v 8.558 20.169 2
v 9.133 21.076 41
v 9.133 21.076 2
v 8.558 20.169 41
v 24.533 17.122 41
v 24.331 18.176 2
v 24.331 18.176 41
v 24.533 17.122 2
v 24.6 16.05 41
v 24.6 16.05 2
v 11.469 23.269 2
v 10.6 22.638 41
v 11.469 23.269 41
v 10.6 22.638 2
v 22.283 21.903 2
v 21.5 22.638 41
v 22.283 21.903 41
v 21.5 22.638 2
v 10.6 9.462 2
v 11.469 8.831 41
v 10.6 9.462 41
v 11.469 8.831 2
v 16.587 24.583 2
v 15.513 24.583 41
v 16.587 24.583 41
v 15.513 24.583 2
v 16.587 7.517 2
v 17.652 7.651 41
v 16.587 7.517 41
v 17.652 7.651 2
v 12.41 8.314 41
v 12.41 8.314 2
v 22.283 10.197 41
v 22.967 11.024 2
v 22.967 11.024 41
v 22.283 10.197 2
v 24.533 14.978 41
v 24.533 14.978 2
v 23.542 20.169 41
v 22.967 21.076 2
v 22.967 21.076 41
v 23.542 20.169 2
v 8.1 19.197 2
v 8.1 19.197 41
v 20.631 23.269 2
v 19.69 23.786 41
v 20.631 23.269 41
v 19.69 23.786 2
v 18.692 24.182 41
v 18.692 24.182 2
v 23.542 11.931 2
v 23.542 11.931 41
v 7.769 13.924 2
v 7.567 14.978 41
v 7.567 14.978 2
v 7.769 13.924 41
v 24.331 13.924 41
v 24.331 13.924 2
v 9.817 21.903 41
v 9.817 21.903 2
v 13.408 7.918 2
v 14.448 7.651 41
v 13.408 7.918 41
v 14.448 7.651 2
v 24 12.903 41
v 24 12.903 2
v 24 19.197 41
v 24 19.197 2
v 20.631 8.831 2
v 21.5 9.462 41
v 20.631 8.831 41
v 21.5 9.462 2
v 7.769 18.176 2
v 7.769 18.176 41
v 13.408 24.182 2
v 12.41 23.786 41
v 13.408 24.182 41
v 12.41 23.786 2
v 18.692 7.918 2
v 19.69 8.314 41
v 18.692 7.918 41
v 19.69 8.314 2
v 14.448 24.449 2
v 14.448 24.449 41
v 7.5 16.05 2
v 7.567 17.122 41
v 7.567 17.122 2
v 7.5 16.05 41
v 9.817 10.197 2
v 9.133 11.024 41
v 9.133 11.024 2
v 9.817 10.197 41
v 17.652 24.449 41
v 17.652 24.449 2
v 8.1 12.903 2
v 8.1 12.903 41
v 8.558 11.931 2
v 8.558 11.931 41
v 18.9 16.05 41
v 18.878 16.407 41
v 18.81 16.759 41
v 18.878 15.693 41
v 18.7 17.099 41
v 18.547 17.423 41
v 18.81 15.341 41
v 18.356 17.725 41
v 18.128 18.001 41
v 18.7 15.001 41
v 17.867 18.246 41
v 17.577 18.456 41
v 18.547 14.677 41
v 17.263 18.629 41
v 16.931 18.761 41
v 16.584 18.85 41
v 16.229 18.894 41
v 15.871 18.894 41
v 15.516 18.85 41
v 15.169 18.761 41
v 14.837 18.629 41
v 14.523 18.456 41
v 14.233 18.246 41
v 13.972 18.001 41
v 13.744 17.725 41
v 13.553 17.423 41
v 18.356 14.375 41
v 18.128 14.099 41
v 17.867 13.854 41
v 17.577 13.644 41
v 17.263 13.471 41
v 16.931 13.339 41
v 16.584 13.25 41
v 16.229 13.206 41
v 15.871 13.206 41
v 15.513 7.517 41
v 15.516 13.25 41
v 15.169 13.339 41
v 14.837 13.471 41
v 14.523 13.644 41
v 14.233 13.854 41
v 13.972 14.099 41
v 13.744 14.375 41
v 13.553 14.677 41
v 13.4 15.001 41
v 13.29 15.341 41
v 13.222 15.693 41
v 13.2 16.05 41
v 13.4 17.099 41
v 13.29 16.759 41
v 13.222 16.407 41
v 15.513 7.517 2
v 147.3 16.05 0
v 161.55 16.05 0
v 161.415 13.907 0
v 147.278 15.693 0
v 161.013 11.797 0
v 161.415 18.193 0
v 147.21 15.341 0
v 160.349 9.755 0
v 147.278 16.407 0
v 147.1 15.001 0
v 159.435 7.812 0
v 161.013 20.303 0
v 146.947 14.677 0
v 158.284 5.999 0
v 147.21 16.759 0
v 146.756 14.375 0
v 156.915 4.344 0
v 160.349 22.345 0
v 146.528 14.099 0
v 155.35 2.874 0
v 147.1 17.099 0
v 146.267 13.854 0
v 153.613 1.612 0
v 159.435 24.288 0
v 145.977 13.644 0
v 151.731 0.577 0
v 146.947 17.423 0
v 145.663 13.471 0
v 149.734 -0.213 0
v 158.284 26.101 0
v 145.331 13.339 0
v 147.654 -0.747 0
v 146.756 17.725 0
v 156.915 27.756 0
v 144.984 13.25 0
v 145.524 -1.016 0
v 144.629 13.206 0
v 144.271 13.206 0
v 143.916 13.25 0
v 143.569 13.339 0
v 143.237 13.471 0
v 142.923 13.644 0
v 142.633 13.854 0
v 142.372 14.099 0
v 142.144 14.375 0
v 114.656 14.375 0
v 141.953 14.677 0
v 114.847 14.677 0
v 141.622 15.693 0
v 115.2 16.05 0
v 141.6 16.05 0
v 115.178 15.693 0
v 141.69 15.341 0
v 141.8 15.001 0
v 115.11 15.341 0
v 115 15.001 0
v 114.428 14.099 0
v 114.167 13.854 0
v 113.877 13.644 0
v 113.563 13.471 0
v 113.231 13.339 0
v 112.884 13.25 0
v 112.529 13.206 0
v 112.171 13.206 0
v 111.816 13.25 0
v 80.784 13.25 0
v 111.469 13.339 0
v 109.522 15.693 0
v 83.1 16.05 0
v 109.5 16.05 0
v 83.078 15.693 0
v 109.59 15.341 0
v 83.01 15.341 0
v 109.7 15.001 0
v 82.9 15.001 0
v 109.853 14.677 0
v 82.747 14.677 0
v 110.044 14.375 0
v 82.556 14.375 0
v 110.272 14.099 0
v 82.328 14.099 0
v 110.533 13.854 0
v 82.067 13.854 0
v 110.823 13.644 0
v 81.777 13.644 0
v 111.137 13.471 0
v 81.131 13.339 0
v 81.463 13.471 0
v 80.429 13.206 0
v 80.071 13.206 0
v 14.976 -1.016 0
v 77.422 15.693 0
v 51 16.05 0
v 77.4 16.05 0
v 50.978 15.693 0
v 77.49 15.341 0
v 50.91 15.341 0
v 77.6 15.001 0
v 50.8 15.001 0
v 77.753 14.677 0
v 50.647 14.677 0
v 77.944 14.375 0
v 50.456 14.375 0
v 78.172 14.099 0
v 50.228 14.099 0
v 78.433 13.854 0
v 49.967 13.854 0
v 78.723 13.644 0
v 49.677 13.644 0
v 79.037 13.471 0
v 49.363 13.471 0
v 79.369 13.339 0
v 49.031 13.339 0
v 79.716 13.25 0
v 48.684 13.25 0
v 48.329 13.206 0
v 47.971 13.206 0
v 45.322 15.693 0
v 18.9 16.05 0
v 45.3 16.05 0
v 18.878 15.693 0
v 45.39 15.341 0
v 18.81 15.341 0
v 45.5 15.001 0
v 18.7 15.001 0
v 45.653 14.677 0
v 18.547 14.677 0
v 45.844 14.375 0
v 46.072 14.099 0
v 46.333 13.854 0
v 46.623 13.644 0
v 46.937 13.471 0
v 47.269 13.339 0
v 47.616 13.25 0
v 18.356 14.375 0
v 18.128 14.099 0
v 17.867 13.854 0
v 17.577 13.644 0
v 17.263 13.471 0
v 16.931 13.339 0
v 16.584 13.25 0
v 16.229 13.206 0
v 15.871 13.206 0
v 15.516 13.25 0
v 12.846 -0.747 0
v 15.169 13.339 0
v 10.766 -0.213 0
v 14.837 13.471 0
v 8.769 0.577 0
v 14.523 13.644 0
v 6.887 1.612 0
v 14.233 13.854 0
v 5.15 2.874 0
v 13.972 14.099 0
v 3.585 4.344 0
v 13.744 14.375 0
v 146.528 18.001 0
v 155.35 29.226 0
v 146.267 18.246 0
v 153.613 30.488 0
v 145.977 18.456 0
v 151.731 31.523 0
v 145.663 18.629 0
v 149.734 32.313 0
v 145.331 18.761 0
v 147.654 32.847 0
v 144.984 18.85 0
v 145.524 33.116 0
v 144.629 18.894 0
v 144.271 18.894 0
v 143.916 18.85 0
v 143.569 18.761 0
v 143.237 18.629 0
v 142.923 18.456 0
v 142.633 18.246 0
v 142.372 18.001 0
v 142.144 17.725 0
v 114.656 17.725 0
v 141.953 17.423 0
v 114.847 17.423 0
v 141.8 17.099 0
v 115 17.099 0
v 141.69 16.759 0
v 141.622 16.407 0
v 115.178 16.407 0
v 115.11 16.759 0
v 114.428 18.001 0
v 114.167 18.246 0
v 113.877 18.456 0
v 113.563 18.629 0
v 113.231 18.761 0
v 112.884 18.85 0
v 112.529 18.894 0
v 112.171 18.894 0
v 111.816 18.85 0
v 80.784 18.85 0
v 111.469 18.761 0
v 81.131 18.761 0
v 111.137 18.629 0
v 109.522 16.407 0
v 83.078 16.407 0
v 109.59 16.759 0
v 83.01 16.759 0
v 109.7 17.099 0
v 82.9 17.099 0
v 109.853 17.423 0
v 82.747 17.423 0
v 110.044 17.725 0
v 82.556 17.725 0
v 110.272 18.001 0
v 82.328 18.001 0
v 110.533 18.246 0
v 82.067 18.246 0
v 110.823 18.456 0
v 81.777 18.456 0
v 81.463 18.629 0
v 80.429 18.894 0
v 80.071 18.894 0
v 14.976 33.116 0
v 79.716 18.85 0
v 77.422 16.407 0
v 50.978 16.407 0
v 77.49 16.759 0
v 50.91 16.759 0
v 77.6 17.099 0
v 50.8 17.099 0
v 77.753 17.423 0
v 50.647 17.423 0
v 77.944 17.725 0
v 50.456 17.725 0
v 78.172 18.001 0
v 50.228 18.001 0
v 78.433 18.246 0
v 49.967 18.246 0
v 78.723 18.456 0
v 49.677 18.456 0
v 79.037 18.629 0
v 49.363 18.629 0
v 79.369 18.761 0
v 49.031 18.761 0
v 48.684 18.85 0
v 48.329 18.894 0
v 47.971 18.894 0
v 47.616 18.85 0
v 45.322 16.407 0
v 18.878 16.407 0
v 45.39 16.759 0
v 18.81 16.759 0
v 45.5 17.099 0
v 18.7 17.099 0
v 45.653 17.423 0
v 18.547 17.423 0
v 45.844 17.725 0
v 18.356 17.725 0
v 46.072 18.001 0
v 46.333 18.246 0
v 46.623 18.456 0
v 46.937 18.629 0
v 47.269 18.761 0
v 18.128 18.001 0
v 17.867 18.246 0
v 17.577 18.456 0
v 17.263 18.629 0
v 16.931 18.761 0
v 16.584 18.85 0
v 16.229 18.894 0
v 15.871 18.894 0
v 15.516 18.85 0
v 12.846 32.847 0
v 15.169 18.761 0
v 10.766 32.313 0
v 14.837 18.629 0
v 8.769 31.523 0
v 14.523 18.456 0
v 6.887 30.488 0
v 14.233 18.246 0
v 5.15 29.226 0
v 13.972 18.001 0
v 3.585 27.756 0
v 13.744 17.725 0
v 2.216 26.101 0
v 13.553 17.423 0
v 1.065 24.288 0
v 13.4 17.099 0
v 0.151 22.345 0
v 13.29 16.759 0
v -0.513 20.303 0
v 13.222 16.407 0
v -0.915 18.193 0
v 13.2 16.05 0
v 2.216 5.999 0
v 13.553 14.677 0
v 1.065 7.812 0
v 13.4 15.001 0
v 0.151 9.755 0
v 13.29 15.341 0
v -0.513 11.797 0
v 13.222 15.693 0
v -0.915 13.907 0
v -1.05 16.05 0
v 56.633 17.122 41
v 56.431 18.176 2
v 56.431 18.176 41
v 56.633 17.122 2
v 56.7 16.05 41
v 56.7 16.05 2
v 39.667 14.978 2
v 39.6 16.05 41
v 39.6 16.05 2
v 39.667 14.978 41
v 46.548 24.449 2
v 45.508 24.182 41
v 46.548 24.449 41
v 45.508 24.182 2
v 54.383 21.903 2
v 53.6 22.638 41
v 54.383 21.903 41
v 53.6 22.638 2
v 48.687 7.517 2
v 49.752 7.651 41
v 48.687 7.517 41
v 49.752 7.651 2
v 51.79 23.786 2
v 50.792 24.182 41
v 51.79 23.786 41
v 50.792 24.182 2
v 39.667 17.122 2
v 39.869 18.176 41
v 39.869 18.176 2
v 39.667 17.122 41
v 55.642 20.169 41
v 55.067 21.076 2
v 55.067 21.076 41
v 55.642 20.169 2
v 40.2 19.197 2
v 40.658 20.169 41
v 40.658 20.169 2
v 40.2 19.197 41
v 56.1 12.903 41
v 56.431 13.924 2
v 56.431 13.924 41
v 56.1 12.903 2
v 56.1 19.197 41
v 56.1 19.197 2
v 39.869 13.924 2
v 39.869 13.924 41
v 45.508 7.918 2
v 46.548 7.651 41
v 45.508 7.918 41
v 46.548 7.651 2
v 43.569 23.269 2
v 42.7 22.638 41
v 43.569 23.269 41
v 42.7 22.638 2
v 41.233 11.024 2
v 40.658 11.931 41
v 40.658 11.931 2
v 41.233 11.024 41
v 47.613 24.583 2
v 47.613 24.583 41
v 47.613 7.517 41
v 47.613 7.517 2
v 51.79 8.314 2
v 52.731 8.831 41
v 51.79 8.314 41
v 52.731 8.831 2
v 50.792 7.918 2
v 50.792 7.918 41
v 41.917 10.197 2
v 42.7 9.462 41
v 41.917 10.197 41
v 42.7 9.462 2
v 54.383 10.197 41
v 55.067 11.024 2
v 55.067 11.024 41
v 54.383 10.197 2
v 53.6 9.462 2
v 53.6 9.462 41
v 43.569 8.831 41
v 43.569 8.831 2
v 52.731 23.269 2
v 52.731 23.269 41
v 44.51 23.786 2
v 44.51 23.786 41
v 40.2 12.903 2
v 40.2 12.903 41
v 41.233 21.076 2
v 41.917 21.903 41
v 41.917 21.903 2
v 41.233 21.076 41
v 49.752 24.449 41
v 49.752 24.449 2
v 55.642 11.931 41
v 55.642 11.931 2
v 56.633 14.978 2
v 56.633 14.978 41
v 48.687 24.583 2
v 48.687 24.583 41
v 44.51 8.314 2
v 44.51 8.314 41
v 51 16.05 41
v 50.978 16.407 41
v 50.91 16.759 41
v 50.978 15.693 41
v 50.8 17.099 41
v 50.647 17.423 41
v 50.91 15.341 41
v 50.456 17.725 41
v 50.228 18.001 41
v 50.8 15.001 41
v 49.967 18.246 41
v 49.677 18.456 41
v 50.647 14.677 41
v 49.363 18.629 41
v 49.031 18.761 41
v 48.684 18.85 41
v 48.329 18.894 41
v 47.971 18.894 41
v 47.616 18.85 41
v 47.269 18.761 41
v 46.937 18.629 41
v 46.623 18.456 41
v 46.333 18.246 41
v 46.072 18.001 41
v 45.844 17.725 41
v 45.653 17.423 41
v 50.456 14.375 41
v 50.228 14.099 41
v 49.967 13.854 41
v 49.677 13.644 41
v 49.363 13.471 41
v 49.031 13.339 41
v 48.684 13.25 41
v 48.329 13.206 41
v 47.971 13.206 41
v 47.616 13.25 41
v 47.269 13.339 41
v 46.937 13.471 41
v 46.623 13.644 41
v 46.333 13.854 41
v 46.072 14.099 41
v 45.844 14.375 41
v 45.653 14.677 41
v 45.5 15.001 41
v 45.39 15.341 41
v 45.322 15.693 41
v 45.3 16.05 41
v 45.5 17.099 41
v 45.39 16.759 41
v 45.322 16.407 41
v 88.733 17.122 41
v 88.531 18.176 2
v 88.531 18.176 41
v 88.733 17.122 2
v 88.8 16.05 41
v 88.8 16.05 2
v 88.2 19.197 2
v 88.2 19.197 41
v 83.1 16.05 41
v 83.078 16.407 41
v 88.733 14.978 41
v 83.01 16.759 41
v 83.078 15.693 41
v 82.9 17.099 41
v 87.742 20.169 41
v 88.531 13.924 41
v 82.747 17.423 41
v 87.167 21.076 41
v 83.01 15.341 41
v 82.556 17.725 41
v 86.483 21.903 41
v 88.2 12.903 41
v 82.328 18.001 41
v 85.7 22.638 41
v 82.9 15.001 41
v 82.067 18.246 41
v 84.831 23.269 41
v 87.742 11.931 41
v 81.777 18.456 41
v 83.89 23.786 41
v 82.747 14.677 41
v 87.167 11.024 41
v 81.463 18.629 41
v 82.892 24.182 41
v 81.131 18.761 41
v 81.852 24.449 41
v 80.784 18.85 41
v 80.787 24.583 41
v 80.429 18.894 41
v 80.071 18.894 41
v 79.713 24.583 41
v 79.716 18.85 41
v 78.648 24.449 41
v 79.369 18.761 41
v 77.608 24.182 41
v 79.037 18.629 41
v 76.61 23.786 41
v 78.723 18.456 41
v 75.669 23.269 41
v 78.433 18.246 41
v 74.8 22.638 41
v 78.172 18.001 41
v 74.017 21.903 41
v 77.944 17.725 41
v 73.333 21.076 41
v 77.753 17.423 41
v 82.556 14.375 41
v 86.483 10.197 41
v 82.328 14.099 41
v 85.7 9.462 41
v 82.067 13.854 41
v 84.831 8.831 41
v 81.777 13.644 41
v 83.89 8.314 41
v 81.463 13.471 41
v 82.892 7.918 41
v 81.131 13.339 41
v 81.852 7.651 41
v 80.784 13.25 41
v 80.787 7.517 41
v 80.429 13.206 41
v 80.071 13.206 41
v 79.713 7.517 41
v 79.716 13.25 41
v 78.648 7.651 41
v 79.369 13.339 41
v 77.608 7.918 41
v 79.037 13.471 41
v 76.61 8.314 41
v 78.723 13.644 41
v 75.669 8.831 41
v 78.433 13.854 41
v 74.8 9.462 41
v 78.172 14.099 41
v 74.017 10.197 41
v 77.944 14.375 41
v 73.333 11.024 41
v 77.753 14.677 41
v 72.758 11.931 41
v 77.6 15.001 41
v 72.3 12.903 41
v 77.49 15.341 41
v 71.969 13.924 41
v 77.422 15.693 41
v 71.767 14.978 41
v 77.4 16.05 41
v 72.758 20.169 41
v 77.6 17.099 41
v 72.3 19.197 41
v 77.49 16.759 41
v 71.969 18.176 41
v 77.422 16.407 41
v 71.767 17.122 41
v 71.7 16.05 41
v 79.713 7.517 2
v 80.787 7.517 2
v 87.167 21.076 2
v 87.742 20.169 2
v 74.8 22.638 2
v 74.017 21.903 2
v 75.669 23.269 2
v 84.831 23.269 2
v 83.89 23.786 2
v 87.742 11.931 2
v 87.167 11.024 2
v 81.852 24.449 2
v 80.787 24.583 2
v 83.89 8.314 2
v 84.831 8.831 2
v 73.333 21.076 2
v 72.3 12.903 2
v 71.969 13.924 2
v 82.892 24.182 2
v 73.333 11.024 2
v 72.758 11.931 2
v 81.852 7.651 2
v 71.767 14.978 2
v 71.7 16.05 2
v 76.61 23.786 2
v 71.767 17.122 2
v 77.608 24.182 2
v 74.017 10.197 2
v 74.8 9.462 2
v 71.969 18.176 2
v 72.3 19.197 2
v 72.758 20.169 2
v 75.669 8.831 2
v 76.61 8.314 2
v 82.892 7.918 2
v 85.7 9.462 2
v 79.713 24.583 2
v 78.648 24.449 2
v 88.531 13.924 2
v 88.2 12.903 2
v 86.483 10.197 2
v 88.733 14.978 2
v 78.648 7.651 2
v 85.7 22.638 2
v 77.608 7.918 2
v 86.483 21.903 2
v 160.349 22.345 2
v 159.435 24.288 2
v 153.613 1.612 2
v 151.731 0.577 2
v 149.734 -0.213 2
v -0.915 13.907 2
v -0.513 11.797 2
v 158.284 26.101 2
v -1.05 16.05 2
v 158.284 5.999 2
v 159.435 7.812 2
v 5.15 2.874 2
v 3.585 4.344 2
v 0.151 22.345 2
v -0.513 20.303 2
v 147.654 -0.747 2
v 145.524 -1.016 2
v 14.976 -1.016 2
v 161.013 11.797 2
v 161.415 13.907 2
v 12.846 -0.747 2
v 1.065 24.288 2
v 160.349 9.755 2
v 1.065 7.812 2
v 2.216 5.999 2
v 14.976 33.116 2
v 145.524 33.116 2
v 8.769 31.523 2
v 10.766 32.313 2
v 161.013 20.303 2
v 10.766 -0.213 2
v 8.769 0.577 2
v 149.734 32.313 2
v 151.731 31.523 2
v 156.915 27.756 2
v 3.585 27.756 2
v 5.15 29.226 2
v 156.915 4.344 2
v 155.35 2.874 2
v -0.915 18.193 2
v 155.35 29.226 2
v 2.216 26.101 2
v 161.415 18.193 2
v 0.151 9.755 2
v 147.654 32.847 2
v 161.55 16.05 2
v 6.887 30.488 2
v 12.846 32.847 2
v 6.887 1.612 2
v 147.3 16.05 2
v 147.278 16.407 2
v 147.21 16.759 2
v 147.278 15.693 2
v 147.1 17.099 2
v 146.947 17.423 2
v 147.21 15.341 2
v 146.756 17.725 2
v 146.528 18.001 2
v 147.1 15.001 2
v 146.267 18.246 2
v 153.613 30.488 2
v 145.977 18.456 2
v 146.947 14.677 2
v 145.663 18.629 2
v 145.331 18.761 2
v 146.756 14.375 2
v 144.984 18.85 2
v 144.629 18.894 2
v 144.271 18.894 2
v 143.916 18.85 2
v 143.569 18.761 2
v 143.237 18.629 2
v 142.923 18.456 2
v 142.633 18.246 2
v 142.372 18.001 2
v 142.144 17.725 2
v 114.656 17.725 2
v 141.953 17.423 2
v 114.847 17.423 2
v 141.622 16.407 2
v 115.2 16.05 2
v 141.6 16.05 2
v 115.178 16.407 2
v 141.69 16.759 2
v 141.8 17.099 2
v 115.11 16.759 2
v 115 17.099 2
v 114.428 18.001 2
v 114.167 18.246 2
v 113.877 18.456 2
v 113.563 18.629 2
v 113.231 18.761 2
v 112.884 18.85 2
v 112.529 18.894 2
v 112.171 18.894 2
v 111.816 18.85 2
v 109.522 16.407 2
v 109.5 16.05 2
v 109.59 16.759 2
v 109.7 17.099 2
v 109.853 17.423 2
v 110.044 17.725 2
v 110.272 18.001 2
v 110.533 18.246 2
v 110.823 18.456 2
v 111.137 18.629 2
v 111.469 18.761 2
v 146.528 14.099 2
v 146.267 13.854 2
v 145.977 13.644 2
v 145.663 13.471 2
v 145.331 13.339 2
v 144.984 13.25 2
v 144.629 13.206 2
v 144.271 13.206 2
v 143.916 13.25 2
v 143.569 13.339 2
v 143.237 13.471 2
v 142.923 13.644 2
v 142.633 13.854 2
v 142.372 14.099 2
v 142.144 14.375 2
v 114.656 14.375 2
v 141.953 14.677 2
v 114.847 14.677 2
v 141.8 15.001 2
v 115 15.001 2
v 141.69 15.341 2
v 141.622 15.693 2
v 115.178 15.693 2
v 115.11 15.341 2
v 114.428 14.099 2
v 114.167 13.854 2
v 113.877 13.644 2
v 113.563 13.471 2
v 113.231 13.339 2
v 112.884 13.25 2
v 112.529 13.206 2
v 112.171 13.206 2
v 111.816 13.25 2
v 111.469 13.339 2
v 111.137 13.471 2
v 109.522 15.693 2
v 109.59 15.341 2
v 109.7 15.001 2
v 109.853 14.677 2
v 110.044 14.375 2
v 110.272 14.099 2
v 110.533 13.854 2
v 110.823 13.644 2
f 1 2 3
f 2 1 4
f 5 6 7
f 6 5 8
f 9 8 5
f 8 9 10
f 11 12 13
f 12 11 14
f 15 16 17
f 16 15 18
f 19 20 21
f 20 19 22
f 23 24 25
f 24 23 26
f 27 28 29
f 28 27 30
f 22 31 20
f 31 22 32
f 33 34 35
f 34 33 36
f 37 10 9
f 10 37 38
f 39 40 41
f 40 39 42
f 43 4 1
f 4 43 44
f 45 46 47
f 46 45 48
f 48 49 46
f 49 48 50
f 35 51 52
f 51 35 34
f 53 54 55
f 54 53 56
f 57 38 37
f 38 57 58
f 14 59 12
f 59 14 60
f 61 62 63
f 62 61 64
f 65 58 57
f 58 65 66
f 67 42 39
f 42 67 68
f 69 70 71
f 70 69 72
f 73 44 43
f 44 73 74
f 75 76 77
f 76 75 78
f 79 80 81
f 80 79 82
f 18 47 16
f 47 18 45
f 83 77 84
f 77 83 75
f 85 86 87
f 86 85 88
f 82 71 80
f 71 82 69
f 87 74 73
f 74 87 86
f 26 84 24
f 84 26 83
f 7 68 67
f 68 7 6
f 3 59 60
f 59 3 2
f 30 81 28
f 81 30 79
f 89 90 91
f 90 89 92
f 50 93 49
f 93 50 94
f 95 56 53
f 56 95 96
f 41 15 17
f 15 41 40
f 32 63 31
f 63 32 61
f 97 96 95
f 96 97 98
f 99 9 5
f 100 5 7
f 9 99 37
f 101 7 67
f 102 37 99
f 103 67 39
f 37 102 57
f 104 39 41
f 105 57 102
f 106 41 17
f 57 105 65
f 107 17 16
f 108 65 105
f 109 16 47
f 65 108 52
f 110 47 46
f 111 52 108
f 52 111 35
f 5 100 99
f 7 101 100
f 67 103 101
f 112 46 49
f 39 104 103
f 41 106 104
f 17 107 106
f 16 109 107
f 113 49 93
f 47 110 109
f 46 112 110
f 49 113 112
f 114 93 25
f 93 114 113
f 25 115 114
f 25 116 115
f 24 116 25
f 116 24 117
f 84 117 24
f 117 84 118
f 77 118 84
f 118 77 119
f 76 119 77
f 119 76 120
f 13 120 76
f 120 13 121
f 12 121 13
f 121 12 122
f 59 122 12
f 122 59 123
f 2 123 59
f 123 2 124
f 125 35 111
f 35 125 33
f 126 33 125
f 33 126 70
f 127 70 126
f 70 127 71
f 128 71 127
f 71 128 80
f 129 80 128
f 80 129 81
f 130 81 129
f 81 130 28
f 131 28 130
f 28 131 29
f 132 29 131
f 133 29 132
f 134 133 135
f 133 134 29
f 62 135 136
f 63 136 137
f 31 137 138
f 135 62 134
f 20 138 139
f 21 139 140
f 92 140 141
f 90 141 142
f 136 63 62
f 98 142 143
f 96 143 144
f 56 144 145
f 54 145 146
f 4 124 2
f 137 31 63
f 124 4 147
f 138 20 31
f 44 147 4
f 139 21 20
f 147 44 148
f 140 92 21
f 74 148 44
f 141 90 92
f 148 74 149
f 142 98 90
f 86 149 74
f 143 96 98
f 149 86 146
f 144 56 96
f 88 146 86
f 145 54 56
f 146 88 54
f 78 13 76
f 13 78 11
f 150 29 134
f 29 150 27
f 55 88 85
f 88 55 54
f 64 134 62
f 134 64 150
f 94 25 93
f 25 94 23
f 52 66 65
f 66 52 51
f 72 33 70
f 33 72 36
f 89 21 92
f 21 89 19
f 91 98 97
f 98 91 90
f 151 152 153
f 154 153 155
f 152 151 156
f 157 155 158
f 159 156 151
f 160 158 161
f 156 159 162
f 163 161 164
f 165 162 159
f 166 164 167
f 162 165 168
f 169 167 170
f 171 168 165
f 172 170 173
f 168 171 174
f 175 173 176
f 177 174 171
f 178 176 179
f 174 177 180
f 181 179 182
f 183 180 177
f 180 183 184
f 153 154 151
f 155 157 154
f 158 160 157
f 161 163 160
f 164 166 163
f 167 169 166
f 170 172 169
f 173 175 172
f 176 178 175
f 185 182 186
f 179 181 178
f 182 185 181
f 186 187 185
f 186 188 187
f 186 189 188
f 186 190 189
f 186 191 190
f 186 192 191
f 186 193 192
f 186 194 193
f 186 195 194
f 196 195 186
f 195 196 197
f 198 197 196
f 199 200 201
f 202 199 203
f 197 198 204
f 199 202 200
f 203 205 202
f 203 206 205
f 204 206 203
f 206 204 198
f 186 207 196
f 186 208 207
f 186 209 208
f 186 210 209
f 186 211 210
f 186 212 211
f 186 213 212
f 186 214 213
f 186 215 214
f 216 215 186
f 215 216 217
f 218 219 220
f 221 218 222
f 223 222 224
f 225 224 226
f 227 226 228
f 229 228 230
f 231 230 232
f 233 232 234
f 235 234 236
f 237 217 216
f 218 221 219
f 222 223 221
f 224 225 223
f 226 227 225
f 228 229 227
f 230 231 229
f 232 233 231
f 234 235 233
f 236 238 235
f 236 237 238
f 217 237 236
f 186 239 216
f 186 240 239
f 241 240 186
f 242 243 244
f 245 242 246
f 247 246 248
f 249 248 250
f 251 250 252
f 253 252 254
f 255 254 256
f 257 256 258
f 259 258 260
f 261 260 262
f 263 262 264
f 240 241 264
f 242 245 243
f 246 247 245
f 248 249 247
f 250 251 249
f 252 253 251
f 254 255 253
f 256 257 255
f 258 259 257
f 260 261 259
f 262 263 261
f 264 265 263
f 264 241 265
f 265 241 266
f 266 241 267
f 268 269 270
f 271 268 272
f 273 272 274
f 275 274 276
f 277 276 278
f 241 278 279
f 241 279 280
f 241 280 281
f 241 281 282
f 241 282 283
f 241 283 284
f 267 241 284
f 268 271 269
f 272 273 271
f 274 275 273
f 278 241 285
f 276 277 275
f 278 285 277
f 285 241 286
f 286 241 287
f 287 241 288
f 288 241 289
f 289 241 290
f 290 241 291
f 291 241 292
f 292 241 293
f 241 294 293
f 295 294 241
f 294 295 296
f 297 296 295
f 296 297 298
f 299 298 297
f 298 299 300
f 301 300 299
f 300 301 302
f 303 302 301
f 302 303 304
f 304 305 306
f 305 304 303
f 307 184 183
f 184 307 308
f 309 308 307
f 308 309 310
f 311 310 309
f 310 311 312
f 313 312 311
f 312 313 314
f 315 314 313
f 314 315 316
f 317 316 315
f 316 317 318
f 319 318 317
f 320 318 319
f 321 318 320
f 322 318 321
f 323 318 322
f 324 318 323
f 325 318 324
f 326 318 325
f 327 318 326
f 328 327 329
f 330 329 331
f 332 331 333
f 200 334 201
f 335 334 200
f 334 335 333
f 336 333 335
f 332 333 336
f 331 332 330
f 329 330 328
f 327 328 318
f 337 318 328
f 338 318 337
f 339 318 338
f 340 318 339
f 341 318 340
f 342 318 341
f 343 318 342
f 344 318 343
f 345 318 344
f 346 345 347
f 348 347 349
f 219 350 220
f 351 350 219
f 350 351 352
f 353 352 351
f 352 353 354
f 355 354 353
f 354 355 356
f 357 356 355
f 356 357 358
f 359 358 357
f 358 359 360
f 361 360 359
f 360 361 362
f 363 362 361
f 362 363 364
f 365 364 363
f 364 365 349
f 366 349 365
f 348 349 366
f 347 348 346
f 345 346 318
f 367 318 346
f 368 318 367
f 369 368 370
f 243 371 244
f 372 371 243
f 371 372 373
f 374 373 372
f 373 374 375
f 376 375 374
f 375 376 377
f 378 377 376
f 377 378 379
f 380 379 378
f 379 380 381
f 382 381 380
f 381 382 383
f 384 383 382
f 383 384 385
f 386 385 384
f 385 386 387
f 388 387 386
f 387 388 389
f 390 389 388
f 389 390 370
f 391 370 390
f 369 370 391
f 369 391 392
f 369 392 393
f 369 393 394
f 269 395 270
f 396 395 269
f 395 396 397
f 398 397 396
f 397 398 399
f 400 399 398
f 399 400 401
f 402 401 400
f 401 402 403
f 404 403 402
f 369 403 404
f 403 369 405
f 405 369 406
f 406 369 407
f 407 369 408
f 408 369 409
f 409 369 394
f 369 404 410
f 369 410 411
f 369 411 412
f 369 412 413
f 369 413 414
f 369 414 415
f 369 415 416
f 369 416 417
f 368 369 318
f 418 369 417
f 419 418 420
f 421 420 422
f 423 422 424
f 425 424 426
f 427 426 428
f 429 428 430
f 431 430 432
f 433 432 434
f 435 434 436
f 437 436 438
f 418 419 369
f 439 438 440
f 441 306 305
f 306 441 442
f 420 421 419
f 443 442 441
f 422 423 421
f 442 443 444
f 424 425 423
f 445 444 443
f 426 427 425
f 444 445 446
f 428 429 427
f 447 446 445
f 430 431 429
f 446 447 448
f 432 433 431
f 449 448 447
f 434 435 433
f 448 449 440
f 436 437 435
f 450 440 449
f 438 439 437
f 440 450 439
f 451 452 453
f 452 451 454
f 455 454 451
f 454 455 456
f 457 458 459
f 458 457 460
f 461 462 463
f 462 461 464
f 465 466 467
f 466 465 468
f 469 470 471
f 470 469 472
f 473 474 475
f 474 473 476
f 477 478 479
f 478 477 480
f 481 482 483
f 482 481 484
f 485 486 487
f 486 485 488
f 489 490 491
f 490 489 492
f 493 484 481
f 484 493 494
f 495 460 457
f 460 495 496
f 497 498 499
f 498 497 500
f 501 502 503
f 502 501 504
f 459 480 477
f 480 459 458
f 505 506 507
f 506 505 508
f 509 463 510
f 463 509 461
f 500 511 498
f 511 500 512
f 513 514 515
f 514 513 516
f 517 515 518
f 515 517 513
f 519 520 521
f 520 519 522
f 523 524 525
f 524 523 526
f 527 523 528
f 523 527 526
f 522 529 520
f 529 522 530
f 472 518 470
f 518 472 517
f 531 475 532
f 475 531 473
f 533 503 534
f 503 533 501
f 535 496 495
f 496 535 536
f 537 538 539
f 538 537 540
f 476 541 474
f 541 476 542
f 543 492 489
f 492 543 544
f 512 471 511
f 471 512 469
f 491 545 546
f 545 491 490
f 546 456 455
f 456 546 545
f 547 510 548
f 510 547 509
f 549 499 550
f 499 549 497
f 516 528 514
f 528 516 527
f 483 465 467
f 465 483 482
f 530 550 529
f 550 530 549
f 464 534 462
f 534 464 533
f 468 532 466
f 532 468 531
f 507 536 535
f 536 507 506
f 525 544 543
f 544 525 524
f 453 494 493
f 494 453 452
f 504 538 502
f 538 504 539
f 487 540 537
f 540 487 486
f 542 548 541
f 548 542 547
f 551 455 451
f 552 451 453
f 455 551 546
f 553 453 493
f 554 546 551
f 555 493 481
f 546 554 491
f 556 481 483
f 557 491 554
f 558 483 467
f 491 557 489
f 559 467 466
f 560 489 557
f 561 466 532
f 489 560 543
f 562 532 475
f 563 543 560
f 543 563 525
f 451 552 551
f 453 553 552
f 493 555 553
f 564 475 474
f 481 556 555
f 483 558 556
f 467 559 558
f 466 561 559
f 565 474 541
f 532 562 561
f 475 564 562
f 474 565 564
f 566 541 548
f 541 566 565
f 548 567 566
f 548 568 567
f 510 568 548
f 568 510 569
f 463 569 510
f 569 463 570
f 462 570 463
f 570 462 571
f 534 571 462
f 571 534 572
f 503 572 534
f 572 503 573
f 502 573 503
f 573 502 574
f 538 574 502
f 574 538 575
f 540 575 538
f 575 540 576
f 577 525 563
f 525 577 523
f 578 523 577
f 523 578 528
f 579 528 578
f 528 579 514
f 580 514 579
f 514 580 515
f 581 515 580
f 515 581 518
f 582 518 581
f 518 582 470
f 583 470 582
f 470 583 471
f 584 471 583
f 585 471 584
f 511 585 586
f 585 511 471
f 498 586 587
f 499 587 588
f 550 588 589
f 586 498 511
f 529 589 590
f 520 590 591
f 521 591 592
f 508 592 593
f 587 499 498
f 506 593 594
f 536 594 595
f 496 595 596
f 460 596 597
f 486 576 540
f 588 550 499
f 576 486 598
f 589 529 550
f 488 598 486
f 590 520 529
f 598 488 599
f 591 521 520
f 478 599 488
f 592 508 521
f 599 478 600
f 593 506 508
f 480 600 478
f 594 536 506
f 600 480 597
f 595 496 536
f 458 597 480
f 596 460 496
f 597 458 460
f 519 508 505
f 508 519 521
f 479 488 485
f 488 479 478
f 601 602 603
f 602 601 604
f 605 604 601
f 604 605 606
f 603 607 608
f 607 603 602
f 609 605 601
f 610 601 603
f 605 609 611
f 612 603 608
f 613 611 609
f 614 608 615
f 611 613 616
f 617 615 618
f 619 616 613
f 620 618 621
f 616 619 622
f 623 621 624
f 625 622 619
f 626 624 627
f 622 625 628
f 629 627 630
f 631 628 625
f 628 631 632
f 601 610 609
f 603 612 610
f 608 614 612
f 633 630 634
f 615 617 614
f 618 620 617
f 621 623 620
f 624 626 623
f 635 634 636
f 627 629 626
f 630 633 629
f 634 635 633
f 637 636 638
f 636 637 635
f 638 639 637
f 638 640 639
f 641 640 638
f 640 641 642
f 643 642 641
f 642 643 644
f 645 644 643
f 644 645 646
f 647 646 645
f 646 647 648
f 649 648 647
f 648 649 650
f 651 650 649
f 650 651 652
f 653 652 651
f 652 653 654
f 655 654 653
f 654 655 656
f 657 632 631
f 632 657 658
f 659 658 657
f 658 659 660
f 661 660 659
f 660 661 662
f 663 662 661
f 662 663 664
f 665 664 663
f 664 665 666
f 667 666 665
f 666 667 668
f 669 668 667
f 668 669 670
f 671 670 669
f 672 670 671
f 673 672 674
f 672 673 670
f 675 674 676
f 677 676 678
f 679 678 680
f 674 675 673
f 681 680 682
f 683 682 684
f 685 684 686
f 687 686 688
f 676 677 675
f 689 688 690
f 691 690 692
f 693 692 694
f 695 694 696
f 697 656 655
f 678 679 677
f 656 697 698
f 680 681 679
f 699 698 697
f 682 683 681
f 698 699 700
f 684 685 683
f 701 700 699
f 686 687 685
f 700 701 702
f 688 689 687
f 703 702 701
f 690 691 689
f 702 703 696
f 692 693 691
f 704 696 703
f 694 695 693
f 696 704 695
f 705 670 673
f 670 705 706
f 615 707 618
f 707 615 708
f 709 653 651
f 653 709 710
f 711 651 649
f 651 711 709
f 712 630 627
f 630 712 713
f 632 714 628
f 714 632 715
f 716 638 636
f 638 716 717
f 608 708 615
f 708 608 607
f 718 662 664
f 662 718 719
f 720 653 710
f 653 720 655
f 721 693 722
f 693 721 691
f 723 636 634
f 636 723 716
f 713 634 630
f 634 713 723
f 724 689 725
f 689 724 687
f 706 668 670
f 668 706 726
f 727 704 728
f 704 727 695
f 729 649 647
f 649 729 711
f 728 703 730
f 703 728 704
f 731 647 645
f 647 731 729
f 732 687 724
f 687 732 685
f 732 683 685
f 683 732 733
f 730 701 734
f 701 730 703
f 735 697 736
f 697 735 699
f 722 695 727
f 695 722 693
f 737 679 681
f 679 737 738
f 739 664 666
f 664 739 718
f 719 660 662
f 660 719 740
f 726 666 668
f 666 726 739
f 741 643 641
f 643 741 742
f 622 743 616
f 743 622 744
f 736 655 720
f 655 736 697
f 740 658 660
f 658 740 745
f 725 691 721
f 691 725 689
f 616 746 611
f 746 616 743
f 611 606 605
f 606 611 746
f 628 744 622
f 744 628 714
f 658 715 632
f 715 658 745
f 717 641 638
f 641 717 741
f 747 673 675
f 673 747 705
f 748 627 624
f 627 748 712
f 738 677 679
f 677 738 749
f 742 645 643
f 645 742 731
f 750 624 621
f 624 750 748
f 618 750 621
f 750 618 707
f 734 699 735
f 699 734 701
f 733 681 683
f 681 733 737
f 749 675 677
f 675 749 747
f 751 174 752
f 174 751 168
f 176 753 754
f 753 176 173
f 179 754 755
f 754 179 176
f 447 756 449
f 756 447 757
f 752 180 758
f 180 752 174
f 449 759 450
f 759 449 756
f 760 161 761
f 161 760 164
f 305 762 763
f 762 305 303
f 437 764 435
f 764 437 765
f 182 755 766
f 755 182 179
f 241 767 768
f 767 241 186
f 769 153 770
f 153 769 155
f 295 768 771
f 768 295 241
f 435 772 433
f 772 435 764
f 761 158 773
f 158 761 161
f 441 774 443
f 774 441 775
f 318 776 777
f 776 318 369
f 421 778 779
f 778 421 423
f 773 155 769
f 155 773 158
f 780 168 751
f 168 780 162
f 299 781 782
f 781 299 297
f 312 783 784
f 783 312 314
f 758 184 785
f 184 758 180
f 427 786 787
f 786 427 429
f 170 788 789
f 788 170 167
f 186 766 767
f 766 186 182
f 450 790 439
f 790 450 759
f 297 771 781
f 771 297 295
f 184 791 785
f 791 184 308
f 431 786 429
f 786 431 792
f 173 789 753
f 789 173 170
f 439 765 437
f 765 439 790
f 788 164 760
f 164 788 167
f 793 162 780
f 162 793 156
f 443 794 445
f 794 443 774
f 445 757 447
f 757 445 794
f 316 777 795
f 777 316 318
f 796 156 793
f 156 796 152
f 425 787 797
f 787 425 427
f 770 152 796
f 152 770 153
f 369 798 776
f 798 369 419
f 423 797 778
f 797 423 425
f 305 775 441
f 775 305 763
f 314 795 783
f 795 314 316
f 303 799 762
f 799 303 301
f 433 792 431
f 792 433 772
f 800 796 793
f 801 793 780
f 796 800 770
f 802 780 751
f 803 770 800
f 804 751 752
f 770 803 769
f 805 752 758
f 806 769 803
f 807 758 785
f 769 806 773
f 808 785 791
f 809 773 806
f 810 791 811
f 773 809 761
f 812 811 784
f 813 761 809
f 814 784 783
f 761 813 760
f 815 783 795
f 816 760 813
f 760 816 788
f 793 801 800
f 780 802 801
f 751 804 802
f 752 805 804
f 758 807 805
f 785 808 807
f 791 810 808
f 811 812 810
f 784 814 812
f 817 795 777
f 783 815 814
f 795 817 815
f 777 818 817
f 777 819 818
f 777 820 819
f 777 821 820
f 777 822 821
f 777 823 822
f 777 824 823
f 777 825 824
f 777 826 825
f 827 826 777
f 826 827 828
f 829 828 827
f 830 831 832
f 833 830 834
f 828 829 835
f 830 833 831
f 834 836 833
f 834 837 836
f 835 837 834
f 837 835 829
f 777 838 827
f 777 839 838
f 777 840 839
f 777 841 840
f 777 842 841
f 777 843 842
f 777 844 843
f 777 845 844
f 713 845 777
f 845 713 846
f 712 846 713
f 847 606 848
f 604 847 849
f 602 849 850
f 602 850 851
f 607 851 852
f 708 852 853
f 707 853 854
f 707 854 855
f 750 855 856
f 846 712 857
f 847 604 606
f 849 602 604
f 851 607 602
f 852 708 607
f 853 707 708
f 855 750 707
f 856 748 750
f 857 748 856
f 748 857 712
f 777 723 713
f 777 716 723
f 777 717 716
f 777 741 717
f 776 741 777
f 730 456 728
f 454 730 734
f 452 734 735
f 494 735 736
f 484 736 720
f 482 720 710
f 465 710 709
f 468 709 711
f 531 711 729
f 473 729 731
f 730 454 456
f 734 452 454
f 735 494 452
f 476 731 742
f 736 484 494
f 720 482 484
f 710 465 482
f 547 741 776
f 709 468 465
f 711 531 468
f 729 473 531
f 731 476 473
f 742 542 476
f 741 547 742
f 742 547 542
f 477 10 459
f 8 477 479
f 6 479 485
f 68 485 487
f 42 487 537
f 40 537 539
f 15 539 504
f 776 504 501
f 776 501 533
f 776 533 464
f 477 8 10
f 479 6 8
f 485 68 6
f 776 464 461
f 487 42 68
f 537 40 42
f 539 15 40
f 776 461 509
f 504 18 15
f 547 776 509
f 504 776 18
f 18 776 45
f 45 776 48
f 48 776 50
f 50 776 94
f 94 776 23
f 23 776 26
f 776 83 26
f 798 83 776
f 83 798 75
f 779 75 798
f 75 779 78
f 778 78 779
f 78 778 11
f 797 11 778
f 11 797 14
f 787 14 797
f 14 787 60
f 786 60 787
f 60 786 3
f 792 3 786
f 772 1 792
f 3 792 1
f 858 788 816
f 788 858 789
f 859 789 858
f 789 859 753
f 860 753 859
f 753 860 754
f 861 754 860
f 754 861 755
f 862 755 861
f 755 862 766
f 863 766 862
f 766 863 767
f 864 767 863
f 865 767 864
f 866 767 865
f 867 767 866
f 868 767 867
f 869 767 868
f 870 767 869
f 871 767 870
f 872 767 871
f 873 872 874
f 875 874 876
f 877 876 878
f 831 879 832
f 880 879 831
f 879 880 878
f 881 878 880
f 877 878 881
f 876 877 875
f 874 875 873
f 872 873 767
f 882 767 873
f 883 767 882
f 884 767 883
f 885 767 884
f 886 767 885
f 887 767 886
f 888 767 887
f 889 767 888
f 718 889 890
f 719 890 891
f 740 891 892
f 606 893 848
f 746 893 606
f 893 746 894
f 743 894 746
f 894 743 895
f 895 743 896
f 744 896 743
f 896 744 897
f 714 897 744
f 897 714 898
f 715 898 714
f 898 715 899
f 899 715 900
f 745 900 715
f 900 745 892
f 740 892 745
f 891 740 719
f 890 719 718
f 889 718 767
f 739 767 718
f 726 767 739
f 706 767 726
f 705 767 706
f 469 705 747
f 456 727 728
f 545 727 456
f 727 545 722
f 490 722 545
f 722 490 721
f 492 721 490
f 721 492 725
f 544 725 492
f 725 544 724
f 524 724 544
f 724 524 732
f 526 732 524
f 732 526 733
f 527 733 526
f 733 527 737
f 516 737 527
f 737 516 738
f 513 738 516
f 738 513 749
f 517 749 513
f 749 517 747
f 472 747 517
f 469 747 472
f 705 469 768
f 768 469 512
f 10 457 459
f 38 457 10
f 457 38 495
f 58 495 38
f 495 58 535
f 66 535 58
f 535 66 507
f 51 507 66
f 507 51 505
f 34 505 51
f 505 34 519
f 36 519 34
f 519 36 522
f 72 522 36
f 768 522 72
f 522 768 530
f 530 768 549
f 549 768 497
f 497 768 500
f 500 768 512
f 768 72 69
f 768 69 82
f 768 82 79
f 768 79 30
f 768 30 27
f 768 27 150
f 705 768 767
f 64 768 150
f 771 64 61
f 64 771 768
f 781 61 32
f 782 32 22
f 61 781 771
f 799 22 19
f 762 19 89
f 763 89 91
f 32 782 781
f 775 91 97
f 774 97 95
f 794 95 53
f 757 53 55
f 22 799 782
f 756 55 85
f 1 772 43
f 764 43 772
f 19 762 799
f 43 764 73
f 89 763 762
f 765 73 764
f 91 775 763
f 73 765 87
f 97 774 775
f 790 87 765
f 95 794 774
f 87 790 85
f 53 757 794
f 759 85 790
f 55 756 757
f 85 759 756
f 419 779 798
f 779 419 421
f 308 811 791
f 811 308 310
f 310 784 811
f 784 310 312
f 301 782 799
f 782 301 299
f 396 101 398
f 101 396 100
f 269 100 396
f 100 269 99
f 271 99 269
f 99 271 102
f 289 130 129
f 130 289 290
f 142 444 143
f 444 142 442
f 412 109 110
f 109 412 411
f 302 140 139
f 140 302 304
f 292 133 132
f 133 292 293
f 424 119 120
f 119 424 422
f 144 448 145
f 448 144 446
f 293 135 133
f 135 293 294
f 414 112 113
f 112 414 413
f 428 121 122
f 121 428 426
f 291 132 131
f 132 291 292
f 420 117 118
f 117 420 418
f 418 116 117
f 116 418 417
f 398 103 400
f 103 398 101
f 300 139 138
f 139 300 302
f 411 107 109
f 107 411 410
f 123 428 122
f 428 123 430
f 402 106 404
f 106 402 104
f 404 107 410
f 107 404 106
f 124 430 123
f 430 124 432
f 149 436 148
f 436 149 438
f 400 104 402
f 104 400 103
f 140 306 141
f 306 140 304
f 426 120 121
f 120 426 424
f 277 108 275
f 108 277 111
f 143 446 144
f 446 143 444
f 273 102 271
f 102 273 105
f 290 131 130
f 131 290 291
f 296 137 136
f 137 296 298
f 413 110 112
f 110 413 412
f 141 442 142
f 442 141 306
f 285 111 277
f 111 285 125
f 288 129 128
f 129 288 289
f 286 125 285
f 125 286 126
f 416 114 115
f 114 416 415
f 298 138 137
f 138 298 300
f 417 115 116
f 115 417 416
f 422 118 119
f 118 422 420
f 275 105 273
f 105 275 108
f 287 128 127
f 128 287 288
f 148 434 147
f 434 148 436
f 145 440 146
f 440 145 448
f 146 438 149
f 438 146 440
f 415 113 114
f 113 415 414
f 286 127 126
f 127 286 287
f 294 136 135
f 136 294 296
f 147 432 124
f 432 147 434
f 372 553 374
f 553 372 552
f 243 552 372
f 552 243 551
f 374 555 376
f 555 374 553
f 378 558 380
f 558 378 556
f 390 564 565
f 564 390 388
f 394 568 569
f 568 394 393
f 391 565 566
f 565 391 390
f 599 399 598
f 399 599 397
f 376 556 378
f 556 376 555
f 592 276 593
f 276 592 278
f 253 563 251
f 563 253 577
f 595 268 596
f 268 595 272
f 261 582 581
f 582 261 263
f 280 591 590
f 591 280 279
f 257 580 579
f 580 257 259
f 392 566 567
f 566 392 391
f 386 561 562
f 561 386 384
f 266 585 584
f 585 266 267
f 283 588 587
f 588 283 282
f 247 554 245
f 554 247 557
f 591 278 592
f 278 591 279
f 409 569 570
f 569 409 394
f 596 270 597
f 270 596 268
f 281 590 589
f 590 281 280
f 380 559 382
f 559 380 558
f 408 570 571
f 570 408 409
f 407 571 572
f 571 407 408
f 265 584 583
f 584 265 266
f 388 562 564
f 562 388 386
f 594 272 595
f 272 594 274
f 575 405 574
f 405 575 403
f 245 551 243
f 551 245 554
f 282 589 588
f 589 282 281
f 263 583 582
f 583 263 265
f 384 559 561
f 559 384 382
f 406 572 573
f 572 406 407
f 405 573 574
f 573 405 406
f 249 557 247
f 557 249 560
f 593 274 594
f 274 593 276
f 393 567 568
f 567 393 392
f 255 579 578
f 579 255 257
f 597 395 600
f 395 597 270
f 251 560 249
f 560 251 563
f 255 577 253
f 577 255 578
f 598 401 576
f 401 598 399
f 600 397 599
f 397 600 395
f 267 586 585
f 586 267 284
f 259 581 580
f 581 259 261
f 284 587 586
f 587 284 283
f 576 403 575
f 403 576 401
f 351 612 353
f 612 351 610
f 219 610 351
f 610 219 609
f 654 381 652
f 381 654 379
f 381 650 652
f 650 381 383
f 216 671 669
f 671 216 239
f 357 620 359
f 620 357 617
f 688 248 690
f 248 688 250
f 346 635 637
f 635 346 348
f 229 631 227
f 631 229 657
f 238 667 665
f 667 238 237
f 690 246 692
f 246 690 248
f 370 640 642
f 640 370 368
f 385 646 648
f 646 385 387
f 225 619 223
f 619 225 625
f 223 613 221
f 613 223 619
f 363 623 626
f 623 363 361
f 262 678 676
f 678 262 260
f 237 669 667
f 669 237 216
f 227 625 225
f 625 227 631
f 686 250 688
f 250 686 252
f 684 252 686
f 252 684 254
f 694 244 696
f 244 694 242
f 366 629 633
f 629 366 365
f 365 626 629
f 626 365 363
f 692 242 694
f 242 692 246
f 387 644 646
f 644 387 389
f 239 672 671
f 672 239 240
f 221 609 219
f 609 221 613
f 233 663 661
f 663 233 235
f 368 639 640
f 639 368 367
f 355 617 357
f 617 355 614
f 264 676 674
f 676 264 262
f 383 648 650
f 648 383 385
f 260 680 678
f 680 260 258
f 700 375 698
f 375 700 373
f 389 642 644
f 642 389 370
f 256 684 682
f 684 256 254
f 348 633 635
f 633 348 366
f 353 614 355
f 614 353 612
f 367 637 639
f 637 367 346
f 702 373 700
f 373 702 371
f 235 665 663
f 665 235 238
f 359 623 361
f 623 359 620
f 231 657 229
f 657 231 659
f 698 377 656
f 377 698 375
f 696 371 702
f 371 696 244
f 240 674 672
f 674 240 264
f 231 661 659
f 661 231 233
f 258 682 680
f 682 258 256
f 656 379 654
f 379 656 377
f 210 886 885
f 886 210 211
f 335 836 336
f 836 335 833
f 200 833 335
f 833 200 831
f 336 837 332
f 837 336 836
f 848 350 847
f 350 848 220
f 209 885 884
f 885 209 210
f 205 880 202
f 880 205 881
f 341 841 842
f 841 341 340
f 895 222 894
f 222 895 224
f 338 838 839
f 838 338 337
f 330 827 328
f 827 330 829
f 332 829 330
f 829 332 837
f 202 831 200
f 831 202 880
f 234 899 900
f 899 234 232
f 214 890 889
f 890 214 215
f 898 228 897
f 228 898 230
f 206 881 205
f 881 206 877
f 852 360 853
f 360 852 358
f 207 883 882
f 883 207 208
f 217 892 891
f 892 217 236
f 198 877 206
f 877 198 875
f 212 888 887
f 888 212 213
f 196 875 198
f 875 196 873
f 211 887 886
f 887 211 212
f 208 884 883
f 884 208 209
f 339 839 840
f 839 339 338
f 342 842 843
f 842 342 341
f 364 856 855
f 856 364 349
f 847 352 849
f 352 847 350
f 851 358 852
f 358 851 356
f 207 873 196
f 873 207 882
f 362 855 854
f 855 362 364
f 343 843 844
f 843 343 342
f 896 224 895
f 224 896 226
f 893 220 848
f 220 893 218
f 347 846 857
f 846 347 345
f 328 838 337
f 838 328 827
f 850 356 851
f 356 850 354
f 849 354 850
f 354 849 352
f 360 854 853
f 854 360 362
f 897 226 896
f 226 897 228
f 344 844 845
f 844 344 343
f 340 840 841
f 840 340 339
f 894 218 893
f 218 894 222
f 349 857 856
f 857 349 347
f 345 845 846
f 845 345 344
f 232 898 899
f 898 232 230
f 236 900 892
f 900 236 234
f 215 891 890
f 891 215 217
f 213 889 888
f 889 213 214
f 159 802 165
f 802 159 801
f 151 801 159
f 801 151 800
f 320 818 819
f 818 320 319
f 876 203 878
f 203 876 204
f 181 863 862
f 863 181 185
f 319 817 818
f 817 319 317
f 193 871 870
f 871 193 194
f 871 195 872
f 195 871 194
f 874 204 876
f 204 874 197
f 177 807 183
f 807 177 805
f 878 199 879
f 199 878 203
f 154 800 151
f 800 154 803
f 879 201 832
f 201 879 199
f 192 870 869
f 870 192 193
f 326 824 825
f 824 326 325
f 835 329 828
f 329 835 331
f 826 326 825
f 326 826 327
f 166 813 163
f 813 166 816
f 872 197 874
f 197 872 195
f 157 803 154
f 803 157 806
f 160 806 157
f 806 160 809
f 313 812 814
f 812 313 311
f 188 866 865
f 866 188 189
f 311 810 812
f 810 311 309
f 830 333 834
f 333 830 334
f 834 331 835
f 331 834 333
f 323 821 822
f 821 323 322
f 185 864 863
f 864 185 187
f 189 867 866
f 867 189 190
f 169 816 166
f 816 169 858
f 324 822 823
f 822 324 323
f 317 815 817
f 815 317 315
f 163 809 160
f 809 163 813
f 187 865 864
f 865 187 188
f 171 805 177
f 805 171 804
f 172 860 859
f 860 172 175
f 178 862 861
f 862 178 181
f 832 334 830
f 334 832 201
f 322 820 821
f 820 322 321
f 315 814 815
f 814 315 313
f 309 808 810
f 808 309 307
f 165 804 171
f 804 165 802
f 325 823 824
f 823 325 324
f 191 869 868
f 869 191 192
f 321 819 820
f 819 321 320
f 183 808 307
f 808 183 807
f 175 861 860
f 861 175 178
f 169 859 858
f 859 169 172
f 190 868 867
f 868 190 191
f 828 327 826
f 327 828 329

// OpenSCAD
// Jig for drilling holes into BILLY sides.
// By JI <jayeye@gmail.com>
// The latest version of this file can always be found at
// https://github.com/jayeye/jum/tree/master/src/scad/billyjig

/* [Jig parameters] */ 

// Thickness of template
thickness = 2;

// How much the drill protrudes from the chuck
bit_protrusion = 50;

// How many holes to use as guides
guide_holes = 2;

// How many holes to drill
jig_holes = 3;

// Fudge factor to account for printer tolerances (mine: twice the nozzle size)
slack = .8;

/* [Billy parameters -- you should probably not change these] */

// Spacing between holes
pitch = 32.1;

// Diameter of support pins
diameter = 4.9;

// Depth of pin hole
depth = 9;

$fn = 50;

module billy_jig(
  diameter=diameter,
  pitch=pitch,
  depth=depth,
  thickness=thickness,
  bit_protrusion=bit_protrusion,
  guide_holes=guide_holes,
  jig_holes=jig_holes,
  slack=slack) {
  slack_dia = diameter + slack;
  big_r = 3 * slack_dia / 2;
  r = slack_dia / 2;
  n_holes = guide_holes + jig_holes;
  difference() {
    union() {
      hull() {
        for (o = [1 : n_holes]) {
          translate([pitch * (o - .5), pitch * .5, 0]) { 
             cylinder(r=(2 * big_r), h=thickness);
          }
        }
      }
      for (o = [1 : jig_holes]) {
        translate([pitch * (o - .5), pitch * .5, 0]) { 
          cylinder(r=big_r, h=(bit_protrusion - depth));
        }
      }
    }
    for (o = [1 : n_holes]) {
      translate([pitch * (o - .5), pitch * .5, 0]) {
          cylinder(r=r, h=bit_protrusion);
      }
    }
  }
}
  
billy_jig();
